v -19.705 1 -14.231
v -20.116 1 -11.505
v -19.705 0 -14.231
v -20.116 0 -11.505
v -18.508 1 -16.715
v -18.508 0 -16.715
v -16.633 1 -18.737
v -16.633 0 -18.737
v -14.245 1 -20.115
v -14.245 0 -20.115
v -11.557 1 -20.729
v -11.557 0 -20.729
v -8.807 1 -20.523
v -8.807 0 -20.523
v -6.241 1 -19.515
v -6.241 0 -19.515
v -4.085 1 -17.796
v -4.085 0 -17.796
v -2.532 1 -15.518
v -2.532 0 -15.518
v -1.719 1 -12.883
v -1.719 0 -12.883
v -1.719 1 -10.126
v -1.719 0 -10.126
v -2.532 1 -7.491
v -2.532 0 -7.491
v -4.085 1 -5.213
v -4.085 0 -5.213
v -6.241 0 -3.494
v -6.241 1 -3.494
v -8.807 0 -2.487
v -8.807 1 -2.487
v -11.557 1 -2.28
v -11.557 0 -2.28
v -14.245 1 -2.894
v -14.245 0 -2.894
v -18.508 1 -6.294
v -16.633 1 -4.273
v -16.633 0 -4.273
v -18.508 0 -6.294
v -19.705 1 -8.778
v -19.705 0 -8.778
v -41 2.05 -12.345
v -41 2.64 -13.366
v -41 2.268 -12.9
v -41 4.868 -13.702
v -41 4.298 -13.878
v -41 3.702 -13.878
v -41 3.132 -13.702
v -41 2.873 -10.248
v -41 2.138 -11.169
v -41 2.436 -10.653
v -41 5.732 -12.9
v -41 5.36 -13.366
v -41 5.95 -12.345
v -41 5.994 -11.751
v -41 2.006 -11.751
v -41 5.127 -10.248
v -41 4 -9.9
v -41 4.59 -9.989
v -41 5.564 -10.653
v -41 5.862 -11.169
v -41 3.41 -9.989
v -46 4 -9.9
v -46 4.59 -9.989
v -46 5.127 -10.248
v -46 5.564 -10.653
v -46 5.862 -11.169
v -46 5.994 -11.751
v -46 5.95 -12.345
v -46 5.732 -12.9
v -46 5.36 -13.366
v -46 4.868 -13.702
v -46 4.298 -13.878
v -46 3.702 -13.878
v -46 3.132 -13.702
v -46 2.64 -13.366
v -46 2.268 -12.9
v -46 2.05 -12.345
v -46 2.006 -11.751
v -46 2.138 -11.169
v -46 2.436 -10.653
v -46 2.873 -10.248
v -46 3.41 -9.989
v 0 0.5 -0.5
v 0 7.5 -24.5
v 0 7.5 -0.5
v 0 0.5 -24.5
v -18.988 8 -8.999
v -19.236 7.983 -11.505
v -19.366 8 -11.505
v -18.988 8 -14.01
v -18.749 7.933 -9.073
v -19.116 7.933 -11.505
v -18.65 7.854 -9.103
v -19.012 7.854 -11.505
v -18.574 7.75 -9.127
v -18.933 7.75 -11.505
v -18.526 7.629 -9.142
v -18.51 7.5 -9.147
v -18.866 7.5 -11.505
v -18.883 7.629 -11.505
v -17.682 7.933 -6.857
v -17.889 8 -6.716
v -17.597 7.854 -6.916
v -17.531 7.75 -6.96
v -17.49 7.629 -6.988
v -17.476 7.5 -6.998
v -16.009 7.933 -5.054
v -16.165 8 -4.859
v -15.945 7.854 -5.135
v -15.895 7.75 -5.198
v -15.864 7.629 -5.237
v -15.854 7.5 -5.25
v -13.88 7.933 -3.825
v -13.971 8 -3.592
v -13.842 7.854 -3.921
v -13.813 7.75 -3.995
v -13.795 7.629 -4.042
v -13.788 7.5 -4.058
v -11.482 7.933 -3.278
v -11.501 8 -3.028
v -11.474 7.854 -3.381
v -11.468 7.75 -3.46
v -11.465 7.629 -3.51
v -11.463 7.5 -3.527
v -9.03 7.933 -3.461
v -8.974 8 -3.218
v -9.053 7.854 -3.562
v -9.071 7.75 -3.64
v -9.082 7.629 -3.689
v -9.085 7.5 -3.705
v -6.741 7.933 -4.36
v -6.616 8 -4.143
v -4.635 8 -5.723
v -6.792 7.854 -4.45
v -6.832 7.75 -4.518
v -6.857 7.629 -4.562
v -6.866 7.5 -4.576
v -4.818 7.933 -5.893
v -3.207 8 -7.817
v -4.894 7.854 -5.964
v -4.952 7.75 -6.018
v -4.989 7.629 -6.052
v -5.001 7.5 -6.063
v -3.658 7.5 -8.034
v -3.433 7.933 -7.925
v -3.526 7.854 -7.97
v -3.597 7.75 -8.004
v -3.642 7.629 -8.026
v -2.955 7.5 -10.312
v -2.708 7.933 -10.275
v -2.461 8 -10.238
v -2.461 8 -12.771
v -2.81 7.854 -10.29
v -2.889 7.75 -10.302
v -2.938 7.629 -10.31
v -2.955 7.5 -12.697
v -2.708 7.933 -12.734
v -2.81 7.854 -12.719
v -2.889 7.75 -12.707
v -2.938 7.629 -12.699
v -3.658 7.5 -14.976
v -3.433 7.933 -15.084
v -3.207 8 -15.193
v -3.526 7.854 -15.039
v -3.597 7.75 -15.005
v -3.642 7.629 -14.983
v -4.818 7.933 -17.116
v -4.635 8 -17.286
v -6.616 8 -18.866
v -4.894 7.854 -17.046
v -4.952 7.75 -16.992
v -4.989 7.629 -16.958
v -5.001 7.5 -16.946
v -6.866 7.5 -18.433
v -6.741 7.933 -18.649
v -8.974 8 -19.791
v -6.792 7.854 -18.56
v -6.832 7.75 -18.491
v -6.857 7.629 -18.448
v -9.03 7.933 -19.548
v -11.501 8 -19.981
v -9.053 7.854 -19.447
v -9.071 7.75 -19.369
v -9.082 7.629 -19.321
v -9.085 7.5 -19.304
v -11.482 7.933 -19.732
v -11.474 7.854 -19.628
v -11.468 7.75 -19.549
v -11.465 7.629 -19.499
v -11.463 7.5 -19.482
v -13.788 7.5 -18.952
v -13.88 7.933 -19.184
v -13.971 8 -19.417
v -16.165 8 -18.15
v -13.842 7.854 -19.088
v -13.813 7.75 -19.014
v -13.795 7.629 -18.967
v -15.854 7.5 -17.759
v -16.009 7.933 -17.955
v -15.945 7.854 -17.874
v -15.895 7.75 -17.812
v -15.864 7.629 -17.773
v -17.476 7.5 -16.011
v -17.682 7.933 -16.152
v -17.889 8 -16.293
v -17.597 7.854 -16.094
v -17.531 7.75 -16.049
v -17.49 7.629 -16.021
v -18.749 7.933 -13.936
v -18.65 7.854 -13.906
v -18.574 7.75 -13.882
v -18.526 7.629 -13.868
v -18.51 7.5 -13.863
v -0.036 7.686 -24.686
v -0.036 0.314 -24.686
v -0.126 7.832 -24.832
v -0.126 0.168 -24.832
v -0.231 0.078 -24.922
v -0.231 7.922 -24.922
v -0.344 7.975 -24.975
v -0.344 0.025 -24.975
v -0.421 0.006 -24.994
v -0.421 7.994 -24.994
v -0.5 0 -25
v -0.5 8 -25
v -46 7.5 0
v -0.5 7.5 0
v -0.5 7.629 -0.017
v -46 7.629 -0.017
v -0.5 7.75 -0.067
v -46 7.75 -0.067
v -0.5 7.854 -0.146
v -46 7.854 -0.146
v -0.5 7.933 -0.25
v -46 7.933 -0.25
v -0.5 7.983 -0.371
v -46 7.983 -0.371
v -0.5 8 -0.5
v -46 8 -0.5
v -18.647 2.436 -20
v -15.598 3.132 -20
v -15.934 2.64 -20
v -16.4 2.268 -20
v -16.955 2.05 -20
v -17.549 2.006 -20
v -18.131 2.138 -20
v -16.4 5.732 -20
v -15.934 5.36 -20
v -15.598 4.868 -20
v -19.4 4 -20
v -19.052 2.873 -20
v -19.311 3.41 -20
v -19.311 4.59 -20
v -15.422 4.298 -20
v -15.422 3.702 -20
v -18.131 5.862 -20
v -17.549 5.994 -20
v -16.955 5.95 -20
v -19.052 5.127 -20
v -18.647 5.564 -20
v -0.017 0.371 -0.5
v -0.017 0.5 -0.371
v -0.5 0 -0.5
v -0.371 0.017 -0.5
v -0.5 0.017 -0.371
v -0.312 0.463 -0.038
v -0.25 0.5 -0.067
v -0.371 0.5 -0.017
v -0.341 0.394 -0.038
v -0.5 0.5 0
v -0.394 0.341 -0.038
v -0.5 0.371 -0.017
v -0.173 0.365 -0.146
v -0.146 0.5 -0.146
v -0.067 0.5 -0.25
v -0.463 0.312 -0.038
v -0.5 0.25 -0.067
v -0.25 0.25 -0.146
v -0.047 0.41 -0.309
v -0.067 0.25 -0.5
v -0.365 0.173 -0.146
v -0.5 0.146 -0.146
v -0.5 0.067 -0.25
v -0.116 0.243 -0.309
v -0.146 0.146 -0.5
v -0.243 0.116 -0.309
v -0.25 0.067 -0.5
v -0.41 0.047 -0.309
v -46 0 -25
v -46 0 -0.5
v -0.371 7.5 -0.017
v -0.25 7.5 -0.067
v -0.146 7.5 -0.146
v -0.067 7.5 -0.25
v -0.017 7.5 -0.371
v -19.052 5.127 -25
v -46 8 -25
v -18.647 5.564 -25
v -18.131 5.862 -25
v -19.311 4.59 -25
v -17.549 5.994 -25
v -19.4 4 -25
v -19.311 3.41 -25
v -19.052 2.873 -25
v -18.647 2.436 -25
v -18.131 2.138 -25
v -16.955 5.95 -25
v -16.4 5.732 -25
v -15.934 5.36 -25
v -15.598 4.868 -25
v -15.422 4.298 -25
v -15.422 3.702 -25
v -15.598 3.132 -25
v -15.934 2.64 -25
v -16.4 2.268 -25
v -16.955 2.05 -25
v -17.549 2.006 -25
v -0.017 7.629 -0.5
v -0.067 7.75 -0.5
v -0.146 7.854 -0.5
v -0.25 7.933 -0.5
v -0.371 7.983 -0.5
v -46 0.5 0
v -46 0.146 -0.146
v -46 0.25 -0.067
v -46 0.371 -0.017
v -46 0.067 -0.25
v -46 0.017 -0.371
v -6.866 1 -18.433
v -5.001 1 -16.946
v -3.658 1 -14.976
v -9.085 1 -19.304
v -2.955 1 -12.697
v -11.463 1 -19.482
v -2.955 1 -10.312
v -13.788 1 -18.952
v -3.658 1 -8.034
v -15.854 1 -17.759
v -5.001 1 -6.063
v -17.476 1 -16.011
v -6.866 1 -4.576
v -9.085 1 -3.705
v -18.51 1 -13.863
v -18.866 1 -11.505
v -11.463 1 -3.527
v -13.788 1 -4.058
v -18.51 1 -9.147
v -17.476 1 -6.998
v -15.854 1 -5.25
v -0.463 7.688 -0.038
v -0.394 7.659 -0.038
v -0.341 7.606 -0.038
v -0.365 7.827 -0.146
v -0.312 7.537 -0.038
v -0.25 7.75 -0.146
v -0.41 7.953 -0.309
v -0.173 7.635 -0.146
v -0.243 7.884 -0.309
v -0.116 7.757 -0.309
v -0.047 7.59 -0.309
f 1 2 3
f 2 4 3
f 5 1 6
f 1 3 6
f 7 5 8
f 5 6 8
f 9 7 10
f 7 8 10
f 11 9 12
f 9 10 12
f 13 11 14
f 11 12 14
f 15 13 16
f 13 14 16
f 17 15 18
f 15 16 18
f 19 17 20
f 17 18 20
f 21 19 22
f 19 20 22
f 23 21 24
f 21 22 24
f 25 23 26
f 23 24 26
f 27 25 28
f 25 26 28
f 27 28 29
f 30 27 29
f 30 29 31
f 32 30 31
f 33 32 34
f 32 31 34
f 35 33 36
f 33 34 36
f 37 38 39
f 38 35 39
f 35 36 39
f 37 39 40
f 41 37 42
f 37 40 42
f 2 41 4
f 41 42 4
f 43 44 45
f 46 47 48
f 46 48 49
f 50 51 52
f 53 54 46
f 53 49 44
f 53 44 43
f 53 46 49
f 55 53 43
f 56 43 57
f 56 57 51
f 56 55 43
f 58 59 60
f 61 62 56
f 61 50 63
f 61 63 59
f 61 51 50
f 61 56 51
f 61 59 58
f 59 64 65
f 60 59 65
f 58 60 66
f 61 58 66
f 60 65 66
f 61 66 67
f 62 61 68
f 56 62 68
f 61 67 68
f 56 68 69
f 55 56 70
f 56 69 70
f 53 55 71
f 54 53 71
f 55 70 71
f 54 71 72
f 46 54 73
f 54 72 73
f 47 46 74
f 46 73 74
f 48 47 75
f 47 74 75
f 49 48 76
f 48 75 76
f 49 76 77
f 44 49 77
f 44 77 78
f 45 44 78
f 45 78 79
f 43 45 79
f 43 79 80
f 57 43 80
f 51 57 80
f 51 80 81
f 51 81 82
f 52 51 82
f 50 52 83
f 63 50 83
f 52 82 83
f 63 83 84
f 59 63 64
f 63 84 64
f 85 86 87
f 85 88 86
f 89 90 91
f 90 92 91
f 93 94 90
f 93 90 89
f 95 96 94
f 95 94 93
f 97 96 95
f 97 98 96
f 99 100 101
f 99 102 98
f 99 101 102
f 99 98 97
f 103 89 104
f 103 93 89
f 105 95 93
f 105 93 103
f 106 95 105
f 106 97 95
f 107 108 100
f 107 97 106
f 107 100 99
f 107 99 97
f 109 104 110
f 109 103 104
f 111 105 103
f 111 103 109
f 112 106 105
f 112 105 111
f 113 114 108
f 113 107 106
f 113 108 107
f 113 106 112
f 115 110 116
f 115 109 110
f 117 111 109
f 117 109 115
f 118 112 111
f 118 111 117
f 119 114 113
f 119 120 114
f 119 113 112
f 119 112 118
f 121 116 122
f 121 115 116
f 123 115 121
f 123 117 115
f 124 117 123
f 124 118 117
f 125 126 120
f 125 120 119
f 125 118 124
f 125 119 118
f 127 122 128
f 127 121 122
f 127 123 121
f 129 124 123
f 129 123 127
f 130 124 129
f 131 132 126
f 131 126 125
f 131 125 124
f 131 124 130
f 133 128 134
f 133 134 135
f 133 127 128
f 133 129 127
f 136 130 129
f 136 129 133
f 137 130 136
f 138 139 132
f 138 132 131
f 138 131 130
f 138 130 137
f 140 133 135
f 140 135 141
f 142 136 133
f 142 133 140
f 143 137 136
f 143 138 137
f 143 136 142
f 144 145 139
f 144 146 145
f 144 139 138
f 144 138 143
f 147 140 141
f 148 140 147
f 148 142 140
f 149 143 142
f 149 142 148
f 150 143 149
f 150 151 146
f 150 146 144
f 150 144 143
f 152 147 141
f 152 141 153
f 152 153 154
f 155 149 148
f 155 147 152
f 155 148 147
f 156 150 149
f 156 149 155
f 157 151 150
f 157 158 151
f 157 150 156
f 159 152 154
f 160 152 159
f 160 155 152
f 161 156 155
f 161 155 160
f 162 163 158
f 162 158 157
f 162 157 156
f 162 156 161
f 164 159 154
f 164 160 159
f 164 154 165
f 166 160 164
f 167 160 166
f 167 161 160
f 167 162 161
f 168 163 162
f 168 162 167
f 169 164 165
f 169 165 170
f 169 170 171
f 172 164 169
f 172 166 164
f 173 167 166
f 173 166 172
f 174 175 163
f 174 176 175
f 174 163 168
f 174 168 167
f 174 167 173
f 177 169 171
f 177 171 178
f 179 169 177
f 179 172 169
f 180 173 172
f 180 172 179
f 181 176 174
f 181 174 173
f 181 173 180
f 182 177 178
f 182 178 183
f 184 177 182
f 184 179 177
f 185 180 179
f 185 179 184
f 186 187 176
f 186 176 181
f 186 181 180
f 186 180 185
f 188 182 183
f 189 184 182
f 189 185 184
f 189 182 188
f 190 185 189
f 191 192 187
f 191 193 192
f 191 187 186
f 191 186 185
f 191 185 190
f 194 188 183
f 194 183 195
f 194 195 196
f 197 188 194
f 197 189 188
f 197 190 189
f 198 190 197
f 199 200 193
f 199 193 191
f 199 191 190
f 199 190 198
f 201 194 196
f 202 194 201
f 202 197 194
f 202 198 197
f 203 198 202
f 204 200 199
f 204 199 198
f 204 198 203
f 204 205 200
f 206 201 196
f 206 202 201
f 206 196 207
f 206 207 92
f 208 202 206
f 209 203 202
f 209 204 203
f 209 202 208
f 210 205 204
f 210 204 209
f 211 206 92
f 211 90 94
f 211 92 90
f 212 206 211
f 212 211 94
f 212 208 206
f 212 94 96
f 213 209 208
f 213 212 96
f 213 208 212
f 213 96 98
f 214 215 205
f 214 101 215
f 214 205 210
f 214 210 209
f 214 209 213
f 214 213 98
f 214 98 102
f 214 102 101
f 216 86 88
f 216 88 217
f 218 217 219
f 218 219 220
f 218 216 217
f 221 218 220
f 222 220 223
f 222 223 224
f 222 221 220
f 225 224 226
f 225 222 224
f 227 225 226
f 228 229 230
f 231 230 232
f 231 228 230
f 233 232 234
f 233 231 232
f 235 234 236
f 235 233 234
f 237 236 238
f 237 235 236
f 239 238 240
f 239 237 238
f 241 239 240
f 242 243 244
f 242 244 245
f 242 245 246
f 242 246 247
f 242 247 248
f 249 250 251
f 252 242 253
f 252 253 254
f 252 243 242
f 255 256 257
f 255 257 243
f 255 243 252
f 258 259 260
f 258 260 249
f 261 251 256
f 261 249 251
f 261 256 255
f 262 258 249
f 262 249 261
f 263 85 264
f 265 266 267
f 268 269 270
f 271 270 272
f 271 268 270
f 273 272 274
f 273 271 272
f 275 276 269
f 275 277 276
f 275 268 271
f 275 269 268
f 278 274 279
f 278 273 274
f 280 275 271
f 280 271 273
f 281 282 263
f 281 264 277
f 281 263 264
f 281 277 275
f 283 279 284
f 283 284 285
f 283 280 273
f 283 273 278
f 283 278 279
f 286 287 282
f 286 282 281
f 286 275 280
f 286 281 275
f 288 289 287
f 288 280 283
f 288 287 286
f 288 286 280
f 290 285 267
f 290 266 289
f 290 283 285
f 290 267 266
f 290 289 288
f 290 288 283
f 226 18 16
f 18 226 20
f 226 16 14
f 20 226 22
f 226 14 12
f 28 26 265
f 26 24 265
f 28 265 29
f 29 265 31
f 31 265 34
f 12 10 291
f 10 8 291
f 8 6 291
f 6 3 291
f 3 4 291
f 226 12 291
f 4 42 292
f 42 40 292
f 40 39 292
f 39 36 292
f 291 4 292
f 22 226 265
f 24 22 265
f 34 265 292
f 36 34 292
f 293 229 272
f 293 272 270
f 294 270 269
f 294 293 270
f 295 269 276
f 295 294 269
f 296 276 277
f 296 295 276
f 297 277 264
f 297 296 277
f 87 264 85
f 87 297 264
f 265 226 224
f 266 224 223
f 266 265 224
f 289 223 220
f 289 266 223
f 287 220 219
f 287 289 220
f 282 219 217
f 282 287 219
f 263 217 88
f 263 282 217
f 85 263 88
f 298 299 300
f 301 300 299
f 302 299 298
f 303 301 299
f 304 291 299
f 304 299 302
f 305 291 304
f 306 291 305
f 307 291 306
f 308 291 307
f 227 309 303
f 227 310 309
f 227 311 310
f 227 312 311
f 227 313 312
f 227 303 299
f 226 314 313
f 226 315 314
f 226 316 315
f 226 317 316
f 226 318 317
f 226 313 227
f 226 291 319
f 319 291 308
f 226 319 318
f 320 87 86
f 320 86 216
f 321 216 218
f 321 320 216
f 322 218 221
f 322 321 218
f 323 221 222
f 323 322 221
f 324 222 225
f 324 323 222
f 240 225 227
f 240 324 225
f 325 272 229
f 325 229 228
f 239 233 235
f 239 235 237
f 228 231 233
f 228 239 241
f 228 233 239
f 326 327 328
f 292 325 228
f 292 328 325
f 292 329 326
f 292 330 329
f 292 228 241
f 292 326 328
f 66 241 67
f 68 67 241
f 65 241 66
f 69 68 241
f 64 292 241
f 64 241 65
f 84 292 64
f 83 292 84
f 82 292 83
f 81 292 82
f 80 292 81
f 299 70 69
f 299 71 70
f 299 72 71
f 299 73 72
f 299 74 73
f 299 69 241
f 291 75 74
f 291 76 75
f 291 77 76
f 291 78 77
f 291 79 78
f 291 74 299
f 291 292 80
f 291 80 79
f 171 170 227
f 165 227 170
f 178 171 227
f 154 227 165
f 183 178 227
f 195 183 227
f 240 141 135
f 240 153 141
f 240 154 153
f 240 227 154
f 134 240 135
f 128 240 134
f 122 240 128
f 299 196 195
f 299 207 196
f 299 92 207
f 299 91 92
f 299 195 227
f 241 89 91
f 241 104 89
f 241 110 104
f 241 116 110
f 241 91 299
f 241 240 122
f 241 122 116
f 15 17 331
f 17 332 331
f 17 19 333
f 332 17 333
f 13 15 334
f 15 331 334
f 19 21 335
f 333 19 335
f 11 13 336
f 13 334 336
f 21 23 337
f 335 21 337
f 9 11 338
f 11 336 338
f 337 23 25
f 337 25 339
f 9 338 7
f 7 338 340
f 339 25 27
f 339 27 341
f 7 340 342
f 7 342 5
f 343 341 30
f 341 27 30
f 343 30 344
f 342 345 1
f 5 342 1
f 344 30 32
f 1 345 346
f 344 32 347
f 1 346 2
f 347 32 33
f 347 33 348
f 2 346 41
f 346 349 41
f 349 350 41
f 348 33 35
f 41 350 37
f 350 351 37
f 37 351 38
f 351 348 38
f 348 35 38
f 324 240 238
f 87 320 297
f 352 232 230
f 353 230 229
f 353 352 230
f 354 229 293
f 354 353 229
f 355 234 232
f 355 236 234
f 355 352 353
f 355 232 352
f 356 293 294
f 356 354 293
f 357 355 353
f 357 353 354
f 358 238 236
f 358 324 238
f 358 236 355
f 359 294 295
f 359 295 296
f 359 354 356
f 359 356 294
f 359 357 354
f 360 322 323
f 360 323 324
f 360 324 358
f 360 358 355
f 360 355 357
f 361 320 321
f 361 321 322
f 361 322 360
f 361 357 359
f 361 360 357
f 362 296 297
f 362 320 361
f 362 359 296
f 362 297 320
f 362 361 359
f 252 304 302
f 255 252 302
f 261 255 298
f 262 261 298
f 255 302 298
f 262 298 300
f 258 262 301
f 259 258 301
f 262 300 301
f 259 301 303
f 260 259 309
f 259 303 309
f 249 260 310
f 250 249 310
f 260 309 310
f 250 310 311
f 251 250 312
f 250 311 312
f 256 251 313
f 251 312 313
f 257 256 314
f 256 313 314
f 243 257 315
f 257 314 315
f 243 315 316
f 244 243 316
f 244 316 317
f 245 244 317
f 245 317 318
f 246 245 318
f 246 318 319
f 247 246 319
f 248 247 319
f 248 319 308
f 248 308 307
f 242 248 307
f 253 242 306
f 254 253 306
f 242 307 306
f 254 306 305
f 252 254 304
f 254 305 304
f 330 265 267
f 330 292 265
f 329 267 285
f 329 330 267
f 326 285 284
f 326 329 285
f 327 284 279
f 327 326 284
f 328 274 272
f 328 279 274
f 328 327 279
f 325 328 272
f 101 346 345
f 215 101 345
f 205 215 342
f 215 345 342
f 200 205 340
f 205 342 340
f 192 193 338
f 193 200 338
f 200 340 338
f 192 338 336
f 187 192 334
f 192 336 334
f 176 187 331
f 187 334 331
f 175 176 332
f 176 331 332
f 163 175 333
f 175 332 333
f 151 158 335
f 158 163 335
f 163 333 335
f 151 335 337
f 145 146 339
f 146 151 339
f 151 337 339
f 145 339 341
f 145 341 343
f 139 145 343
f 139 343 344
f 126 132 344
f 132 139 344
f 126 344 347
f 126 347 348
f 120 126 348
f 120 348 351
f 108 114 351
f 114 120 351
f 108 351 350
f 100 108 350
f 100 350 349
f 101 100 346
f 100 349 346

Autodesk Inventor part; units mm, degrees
ref_plane "YZ Plane" through (0, 0, 0) normal (1, 0, 0) x (0, 1, 0)
ref_plane "XZ Plane" through (0, 0, 0) normal (0, 1, 0) x (-1, 0, 0)
ref_plane "XY Plane" through (0, 0, 0) normal (0, 0, 1) x (1, 0, 0)
sketch "Эскиз1" plane through (0, 0, 0) normal (0, 1, 0) x (-1, 0, 0)
  line L0 (0, 0) -> (46, 0)
  line L1 (46, 0) -> (46, -25)
  line L2 (46, -25) -> (0, -25)
  line L3 (0, -25) -> (0, 0)
  circle A0 centre (10.8656, -11.5046) radius 8
  circle A1 centre (10.8656, -11.5046) radius 9.25
  dimension "d0" = 25
  dimension "d1" = 46
  dimension "d2" = 16
  dimension "d3" = 18.5
extrude "Выдавливание1" add sketch "Эскиз1" along normal blind 8 contours L0 L1 L2 L3 | A1
extrude "Выдавливание2" cut sketch "Эскиз1" along normal blind 1 contours A1
sketch "Эскиз2" plane through (-46, 0, -25) normal (-1, 0, 0) x (0, 0, 1)
  line L0 (0, 0) -> (0, 8) projected
  line L1 (0, 4) -> (25, 4) construction
  line L2 (25, 0) -> (25, 8) projected
  circle A0 centre (13.1, 4) radius 2
  dimension "d8" = 4
  dimension "d15" = 13.1
sketch "Эскиз3" plane through (0, 0, -25) normal (0, 0, -1) x (-1, 0, 0)
  line L0 (46, 0) -> (46, 8) projected
  line L1 (46, 4) -> (17.4, 4)
  circle A0 centre (17.4, 4) radius 2
  point P0 (0, 0)
  dimension "d9" = 4
  dimension "d14" = 28.6
extrude "Выдавливание3" cut sketch "Эскиз3" against normal blind 5
extrude "Выдавливание4" cut sketch "Эскиз2" against normal blind 5
fillet "Сопряжение1" radius 0.5 6 edges at (0, 0, -12.5) (0, 8, -12.5) (0, 4, 0) (0, 4, -25) (-23, 8, 0) (-23, 0, 0)
fillet "Сопряжение2" radius 0.5 1 edges at (-2.8656, 8, -11.5046)
properties part number "держатель шкивов 2"
